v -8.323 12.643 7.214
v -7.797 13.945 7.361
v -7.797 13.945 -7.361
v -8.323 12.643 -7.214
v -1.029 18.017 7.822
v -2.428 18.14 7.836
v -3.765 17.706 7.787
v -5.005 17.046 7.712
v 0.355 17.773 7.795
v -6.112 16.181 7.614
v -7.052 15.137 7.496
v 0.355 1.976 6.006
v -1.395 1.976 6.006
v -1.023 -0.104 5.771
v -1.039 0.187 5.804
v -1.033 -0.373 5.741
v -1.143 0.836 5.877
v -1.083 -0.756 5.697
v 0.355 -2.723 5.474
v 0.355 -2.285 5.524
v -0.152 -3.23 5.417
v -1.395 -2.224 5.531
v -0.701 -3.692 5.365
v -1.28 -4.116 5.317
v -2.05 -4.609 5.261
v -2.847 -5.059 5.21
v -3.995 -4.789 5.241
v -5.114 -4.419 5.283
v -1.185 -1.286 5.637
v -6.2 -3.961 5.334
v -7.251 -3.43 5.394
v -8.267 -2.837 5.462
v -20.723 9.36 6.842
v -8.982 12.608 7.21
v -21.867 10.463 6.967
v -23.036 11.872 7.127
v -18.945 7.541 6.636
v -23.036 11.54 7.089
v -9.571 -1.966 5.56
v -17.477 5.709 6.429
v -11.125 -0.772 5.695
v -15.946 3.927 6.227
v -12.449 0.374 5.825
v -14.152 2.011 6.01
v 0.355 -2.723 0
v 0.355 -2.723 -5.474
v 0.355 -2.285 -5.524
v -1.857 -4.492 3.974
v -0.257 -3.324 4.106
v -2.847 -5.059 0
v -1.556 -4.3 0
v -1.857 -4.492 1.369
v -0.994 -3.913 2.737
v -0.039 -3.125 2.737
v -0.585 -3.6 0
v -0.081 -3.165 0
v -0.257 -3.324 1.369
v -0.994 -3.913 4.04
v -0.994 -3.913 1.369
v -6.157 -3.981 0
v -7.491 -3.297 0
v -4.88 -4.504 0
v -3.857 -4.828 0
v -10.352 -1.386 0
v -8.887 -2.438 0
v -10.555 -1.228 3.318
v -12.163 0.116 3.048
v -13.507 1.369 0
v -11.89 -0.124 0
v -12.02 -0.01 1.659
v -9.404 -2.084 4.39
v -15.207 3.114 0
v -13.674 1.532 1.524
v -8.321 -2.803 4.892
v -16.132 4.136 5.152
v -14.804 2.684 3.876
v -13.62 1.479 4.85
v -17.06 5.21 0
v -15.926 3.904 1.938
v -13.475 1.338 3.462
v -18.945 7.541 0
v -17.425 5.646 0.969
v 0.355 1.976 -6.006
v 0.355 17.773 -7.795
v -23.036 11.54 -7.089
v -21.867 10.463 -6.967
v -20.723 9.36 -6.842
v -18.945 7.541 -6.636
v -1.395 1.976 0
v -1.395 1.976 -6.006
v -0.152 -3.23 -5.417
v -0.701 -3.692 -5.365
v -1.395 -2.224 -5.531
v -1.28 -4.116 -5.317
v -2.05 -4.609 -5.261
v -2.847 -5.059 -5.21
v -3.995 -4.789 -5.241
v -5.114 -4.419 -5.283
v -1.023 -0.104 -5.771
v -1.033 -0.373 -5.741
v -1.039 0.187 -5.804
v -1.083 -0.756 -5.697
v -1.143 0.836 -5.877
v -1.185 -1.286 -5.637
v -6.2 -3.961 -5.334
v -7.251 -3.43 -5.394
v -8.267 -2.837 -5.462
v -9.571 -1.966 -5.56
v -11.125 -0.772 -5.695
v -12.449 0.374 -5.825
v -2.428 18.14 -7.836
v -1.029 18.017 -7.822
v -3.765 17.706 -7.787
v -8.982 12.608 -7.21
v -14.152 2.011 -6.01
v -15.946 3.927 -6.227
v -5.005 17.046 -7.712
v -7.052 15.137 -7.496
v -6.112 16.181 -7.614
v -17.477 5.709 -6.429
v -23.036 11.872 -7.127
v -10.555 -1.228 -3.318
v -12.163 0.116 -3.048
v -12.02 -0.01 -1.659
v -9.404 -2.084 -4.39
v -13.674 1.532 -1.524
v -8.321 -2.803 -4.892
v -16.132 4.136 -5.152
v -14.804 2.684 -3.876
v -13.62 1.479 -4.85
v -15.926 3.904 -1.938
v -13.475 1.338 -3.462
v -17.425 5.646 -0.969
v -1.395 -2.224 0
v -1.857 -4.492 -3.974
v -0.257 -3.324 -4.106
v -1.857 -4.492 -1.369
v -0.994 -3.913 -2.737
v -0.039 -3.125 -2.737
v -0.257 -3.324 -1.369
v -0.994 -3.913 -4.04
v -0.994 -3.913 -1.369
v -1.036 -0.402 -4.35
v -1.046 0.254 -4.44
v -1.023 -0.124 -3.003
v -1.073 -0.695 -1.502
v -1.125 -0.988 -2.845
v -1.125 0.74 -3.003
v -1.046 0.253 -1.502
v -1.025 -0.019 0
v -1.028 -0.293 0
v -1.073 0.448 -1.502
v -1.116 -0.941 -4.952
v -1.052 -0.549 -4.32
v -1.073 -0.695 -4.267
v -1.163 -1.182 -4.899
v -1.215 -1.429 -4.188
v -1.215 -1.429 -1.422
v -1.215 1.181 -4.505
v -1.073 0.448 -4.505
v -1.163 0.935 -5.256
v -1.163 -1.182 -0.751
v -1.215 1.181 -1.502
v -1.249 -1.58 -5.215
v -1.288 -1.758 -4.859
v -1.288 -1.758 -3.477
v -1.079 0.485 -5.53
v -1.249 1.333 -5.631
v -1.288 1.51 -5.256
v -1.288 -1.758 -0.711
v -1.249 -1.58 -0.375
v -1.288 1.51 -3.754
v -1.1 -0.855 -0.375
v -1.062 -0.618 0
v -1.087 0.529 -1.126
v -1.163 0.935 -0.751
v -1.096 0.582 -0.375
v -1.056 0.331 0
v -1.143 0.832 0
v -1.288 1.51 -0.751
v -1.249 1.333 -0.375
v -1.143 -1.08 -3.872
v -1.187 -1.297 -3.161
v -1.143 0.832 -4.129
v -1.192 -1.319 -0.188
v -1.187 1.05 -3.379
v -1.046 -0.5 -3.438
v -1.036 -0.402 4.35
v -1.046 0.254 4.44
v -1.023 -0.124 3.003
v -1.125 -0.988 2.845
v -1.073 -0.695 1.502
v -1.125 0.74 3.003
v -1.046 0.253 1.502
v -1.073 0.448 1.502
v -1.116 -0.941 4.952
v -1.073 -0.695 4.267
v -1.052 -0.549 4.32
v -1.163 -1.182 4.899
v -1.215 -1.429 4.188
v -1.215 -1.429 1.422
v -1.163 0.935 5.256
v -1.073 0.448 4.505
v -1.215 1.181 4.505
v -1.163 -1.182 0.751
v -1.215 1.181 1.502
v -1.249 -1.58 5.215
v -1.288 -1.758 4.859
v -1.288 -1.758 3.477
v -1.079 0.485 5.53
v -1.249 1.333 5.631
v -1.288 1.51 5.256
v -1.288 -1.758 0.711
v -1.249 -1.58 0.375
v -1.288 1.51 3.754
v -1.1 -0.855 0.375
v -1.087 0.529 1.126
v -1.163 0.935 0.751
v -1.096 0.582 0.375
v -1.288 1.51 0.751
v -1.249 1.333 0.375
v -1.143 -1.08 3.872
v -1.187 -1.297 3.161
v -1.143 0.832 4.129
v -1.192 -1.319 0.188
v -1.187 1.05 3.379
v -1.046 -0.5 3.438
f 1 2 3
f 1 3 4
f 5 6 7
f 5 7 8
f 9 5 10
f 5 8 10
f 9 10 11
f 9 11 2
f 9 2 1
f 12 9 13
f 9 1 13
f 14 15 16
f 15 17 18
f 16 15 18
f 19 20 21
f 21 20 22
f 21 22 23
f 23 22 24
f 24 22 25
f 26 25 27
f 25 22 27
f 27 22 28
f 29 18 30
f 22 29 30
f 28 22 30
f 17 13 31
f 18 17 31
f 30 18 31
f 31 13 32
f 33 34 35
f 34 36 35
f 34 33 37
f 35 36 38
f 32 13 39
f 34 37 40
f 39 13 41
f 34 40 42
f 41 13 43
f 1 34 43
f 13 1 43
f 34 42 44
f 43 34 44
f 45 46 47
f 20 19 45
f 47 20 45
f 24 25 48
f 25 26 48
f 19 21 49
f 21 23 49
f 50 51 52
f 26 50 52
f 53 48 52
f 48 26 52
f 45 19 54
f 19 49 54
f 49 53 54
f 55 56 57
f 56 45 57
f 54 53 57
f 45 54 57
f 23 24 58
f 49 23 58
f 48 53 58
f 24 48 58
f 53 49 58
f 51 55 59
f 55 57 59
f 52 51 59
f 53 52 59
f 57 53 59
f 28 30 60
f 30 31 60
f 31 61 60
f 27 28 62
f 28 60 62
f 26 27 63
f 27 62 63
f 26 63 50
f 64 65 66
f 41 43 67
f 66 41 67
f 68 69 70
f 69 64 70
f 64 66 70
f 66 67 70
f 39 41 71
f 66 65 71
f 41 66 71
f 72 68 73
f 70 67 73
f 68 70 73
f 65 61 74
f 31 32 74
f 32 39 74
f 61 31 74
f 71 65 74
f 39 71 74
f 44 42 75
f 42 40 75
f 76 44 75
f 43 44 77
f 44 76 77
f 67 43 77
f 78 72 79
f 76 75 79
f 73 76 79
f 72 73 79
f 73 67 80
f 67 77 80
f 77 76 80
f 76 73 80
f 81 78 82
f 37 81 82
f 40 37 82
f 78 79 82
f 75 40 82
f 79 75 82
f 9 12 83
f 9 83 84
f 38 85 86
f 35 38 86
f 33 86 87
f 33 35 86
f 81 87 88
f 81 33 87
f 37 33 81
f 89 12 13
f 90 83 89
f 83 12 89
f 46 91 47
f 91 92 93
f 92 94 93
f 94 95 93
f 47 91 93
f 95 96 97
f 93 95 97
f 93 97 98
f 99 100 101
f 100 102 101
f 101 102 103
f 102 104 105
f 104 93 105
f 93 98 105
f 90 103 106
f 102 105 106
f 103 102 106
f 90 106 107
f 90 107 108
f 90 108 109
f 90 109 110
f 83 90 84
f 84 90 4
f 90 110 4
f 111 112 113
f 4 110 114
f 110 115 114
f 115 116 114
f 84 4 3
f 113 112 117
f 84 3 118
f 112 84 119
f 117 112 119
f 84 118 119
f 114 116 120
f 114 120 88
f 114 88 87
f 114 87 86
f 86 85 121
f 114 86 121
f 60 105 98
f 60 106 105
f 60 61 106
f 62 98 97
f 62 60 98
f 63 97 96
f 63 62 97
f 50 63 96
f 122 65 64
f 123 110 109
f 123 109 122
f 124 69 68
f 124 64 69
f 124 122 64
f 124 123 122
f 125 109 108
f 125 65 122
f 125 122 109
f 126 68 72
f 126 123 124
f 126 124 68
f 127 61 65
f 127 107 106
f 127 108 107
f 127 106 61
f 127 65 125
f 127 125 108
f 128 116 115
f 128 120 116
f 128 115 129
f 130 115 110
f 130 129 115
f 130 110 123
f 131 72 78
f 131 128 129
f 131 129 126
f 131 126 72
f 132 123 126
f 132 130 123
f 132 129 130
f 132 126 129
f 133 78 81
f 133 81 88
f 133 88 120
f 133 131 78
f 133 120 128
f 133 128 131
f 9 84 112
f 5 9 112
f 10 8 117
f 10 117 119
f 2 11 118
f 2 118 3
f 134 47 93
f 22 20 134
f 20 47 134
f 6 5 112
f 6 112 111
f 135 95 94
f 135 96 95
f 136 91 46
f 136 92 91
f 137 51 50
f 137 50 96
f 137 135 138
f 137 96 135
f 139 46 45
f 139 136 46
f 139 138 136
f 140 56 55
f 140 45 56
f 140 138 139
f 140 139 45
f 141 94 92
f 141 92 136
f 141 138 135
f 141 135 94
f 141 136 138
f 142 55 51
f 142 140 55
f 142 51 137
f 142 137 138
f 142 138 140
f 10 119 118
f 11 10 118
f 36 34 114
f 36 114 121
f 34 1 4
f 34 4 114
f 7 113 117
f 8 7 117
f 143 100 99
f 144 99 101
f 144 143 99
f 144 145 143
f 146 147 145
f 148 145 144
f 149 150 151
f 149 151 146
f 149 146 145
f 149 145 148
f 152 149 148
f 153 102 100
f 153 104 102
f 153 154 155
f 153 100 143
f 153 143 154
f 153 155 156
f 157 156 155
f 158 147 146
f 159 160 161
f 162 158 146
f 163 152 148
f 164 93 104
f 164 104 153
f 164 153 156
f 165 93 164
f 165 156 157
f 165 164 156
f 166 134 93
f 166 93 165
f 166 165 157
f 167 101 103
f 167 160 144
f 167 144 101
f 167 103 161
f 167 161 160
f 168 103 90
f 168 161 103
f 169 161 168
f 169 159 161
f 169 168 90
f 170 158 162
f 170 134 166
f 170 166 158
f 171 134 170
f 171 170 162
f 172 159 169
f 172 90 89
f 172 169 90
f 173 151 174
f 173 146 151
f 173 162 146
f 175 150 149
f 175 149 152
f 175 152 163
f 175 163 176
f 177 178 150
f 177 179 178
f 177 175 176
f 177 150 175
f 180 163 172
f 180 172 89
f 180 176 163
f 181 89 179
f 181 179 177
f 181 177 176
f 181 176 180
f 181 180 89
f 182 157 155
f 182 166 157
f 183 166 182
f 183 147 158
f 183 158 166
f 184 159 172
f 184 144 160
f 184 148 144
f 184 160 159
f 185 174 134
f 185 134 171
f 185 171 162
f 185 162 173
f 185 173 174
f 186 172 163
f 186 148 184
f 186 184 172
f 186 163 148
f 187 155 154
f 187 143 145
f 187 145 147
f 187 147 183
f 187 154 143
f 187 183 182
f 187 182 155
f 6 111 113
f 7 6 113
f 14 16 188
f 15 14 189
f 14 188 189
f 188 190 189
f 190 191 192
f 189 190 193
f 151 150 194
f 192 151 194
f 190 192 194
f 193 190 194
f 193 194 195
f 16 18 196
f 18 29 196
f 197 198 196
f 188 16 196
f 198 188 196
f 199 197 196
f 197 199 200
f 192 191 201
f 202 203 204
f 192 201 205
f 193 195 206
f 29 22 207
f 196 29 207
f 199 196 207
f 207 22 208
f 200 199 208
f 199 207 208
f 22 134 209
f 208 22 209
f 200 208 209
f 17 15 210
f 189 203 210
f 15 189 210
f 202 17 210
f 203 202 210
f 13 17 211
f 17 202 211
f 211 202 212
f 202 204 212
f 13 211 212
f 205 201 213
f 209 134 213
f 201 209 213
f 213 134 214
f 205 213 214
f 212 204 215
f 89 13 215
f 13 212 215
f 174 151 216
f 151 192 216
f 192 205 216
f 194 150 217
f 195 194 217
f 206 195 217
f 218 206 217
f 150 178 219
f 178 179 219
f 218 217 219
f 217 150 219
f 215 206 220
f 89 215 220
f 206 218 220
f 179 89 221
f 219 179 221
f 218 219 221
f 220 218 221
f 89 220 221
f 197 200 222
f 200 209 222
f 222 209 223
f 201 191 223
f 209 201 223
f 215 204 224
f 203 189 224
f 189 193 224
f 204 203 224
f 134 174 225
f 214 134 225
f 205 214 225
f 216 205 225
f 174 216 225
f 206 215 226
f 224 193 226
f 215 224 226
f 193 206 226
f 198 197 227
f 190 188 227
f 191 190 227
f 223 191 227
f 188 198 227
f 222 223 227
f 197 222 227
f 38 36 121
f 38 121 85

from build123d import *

# Parameters (mm, degrees)
SALIENTE_EXTRUIR1_DEPTH             = 7.21
SALIENTE_EXTRUIR2_DEPTH             = 7.21
SALIENTE_EXTRUIR2_DEPTH_BACK        = 7.21
CORTAR_EXTRUIR2_DEPTH               = 28.232395202
CORTAR_EXTRUIR2_DEPTH_BACK          = 28.232395202
SALIENTE_EXTRUIR3_REACH             = 29.232
SALIENTE_EXTRUIR3_DIRECTION_2_REACH = 29.232


with BuildPart() as part:
    # Croquis1 → Saliente-Extruir1 (new, symmetric)
    with BuildSketch(Plane.XY):
        with BuildLine():
            add(Edge.make_bspline(
                [(-18.945192114, 7.540918896), (-10.215008384, -3.697644103), (-2.846604825, -5.059081104)],
                knots=[0.497667241, 0.497667241, 0.497667241, 0.49955428, 0.49955428, 0.49955428], degree=2, weights=[1, 1, 1]))
            add(Edge.make_bspline(
                [(-2.846604825, -5.059081104), (-0.742366882, -3.9352066), (0.355125, -2.723253227)],
                knots=[0.498812075, 0.498812075, 0.498812075, 0.499412845, 0.499412845, 0.499412845], degree=2, weights=[1, 1, 1]))
            Line((0.355125, -2.723253227), (0.355125, -2.284841781))
            Line((0.355125, -2.284841781), (-1.394875, -2.223730435))
            add(Edge.make_bspline(
                [(-1.394875, -2.223730435), (-0.90753067, -0.123730435), (-1.394875, 1.976269565)],
                knots=[0, 0, 0, 1, 1, 1], degree=2, weights=[1, 3.231801219, 1]))
            Line((-1.394875, 1.976269565), (0.355125, 2.284841781))
            Line((0.355125, 2.284841781), (0.355125, 3.001549529))
            add(Edge.make_bspline(
                [(0.355125, 3.001549529), (-1.44872627, 6.058427314), (-6.994875026, 10.477389992)],
                knots=[0.500820705, 0.500820705, 0.500820705, 0.502013312, 0.502013312, 0.502013312], degree=2, weights=[1, 1, 1]))
            Line((-6.994875026, 10.477389992), (-8.981845695, 12.608155172))
            Line((-8.981845695, 12.608155172), (-23.035921146, 11.871612288))
            Line((-23.035921146, 11.871612288), (-23.035921146, 11.54013782))
            ThreePointArc((-23.035921146, 11.54013782), (-20.949684518, 9.582335705), (-18.945192114, 7.540918896))
        make_face()
    extrude(amount=SALIENTE_EXTRUIR1_DEPTH, both=True)

    # Croquis4 → Saliente-Extruir2 (add, two sides: drawn at the far end of the back side and taken through both)
    with BuildSketch(Plane.XY.offset(-SALIENTE_EXTRUIR2_DEPTH_BACK)):
        Polygon((-1.394875, 1.976269565), (0.355125, 2.284841781), (0.355125, 1.976269565), align=None)
    extrude(amount=SALIENTE_EXTRUIR2_DEPTH + SALIENTE_EXTRUIR2_DEPTH_BACK)

    # Croquis6 → Cortar-Extruir2 (cut, two sides: drawn at the far end of the back side and taken through both)
    with BuildSketch(Plane(origin=(0, 0, 0), x_dir=(0, 0, -1), z_dir=(1, 0, 0)).offset(-CORTAR_EXTRUIR2_DEPTH_BACK)):
        Polygon((7.21, 12.608155172), (7.21, -5.059081104), (5.21, -5.059081104), align=None)
        Polygon((-7.21, 12.608155172), (-7.21, -5.059081104), (-5.21, -5.059081104), align=None)
    extrude(amount=CORTAR_EXTRUIR2_DEPTH + CORTAR_EXTRUIR2_DEPTH_BACK, mode=Mode.SUBTRACT)

    # Saliente-Extruir3: up to this plane
    saliente_extruir3_end = Plane(origin=(-23.035921146, 12.608155172, 7.21), z_dir=(0, 0.1124854344122626, -0.9936533736897816))
    # Croquis8 → Saliente-Extruir3 (add, up to the surface)
    with BuildSketch(Plane.XY, mode=Mode.PRIVATE) as saliente_extruir3_sk1:
        with BuildLine():
            Line((0.355125, 3.001549529), (0.355125, 17.773466106))
            Line((0.355125, 17.773466106), (-1.028564504, 18.017447899))
            Line((-1.028564504, 18.017447899), (-2.428253067, 18.139904781))
            Line((-2.428253067, 18.139904781), (-3.764520897, 17.705725043))
            Line((-3.764520897, 17.705725043), (-5.005093297, 17.046100998))
            Line((-5.005093297, 17.046100998), (-6.1122761, 16.181074987))
            Line((-6.1122761, 16.181074987), (-7.052428119, 15.136930389))
            Line((-7.052428119, 15.136930389), (-7.796983309, 13.945393009))
            Line((-7.796983309, 13.945393009), (-8.323318739, 12.642667108))
            Line((-8.323318739, 12.642667108), (-9.726428332, 12.56913325))
            add(Edge.make_bspline(
                [(-9.726428332, 12.56913325), (-1.861127424, 6.757298639), (0.355125, 3.001549529)],
                knots=[0.500548048, 0.500548048, 0.500548048, 0.502013312, 0.502013312, 0.502013312], degree=2, weights=[1, 1, 1]))
        make_face()
    saliente_extruir3_tool1 = split(extrude(saliente_extruir3_sk1.sketch, amount=SALIENTE_EXTRUIR3_REACH, mode=Mode.PRIVATE), bisect_by=saliente_extruir3_end, keep=Keep.BOTH, mode=Mode.PRIVATE)
    add(saliente_extruir3_tool1.solids().sort_by_distance((-3.047394, 12.114755, 0))[0])

    # Saliente-Extruir3 direction 2: up to this plane
    saliente_extruir3_direction_2_end = Plane(origin=(-23.035921146, 12.608155172, -7.21), z_dir=(0, 0.1124854344122626, 0.9936533736897816))
    # Croquis8 → Saliente-Extruir3 direction 2 (add, up to the surface)
    with BuildSketch(Plane.XY, mode=Mode.PRIVATE) as saliente_extruir3_direction_2_sk1:
        with BuildLine():
            Line((0.355125, 3.001549529), (0.355125, 17.773466106))
            Line((0.355125, 17.773466106), (-1.028564504, 18.017447899))
            Line((-1.028564504, 18.017447899), (-2.428253067, 18.139904781))
            Line((-2.428253067, 18.139904781), (-3.764520897, 17.705725043))
            Line((-3.764520897, 17.705725043), (-5.005093297, 17.046100998))
            Line((-5.005093297, 17.046100998), (-6.1122761, 16.181074987))
            Line((-6.1122761, 16.181074987), (-7.052428119, 15.136930389))
            Line((-7.052428119, 15.136930389), (-7.796983309, 13.945393009))
            Line((-7.796983309, 13.945393009), (-8.323318739, 12.642667108))
            Line((-8.323318739, 12.642667108), (-9.726428332, 12.56913325))
            add(Edge.make_bspline(
                [(-9.726428332, 12.56913325), (-1.861127424, 6.757298639), (0.355125, 3.001549529)],
                knots=[0.500548048, 0.500548048, 0.500548048, 0.502013312, 0.502013312, 0.502013312], degree=2, weights=[1, 1, 1]))
        make_face()
    saliente_extruir3_direction_2_tool1 = split(extrude(saliente_extruir3_direction_2_sk1.sketch, amount=-SALIENTE_EXTRUIR3_DIRECTION_2_REACH, mode=Mode.PRIVATE), bisect_by=saliente_extruir3_direction_2_end, keep=Keep.BOTH, mode=Mode.PRIVATE)
    add(saliente_extruir3_direction_2_tool1.solids().sort_by_distance((-3.047394, 12.114755, 0))[0])


solid = part.part
